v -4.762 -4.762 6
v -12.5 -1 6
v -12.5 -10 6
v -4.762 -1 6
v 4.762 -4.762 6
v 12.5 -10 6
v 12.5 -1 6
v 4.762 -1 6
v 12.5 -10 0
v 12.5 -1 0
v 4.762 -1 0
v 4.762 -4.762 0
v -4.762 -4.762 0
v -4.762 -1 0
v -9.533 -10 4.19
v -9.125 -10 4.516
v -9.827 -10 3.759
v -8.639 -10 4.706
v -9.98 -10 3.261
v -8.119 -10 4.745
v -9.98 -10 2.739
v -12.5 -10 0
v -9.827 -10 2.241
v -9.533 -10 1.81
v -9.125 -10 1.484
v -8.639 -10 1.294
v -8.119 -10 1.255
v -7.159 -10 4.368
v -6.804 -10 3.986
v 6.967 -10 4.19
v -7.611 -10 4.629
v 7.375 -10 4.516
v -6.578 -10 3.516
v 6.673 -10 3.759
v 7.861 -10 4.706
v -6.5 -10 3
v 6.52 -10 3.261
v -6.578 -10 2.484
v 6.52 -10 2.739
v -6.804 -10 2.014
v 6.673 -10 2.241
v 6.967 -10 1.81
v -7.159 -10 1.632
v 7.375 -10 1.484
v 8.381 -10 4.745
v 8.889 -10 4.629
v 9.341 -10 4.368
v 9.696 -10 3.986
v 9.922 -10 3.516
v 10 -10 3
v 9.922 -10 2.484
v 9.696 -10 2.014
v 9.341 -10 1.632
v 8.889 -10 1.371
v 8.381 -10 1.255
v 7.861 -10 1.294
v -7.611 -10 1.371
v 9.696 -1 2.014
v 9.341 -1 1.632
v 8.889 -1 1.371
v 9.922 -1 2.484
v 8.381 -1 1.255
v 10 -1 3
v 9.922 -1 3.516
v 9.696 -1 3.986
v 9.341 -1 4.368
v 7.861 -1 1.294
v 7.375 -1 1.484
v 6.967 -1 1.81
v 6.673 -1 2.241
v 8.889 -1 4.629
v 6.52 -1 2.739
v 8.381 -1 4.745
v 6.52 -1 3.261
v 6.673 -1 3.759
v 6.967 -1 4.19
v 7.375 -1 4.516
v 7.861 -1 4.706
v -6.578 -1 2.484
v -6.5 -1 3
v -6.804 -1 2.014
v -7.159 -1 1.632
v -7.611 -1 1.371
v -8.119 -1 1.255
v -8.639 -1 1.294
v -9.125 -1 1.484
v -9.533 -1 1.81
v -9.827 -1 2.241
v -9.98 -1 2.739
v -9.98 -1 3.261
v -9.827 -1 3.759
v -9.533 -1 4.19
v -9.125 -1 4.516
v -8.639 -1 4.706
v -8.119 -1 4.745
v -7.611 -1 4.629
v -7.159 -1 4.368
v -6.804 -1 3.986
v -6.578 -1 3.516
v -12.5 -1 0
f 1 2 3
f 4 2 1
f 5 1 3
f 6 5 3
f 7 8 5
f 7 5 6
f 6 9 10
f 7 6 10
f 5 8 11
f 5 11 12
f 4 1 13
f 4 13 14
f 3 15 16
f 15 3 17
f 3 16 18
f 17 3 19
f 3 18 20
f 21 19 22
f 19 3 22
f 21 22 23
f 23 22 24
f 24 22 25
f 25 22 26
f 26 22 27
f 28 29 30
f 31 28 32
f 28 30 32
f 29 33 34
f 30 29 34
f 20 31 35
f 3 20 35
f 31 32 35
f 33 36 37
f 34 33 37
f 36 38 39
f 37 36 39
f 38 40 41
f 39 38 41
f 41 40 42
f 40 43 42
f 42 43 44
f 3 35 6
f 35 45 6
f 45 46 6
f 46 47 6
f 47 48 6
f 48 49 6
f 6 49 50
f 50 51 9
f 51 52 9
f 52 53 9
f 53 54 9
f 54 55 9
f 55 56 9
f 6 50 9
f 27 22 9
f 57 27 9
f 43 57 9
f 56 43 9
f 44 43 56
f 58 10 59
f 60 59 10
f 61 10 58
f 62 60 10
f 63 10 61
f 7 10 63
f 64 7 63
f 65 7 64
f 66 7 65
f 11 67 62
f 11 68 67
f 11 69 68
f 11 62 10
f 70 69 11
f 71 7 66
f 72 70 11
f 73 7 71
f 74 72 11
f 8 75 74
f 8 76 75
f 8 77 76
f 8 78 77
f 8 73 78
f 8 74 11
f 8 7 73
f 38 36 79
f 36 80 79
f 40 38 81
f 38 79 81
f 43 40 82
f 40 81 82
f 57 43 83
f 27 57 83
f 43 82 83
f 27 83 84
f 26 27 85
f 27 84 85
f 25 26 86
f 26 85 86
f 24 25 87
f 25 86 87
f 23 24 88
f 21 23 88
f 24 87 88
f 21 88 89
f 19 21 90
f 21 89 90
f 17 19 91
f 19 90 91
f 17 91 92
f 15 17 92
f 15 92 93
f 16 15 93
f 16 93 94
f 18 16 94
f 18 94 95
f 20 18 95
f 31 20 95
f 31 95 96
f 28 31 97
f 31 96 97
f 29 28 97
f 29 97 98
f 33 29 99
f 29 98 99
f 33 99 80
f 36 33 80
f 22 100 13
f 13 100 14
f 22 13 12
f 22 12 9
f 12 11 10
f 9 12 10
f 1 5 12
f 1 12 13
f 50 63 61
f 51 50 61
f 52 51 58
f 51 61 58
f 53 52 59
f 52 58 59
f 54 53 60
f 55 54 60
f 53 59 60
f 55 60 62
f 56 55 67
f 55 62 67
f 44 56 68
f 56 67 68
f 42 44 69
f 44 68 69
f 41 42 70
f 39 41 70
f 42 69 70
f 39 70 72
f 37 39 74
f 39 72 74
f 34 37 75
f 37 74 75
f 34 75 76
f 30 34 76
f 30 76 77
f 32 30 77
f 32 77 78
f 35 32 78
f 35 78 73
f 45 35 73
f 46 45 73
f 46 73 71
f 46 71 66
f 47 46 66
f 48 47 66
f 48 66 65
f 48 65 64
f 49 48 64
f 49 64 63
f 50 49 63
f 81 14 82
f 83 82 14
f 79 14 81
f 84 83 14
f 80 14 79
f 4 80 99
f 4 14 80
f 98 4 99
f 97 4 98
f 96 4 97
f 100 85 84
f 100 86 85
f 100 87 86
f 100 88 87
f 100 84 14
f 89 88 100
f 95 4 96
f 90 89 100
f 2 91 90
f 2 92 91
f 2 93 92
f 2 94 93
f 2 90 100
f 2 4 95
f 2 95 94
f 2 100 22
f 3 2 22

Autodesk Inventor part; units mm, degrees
ref_plane "YZ Plane" through (0, 0, 0) normal (1, 0, 0) x (0, 1, 0)
ref_plane "XZ Plane" through (0, 0, 0) normal (0, 1, 0) x (-1, 0, 0)
ref_plane "XY Plane" through (0, 0, 0) normal (0, 0, 1) x (1, 0, 0)
sketch "Sketch1" plane through (0, 0, 0) normal (0, 0, 1) x (1, 0, 0)
  arc A0 (-4, 0) -> (4, 0) centre (0, 0) ccw
  line L0 (-4, 0) -> (-12.5, 0)
  line L1 (-12.5, 0) -> (-12.5, -10)
  line L2 (-12.5, -10) -> (12.5, -10)
  line L3 (12.5, -10) -> (12.5, 0)
  line L4 (12.5, 0) -> (4, 0)
  dimension "d0" = 4
  dimension "d1" = 10
  dimension "d2" = 25
extrude "Extrusion1" add sketch "Sketch1" along normal blind 6
sketch "Sketch2" plane through (-12.5, 0, 0) normal (0, 1, 0) x (1, 0, 0)
  line L0 (0, 0) -> (8.5, 0) projected
  line L1 (8.5, -6) -> (0, -6) projected
  line L2 (16.5, 0) -> (25, 0) projected
  line L3 (16.5, 0) -> (16.5, -6) projected
  line L4 (25, -6) -> (16.5, -6) projected
  line L5 (25, 0) -> (25, -6) projected
  line L6 (4.25, 0) -> (4.25, -6) construction
  line L7 (20.75, 0) -> (20.75, -6) construction
  circle A0 centre (4.25, -3) radius 1.75
  circle A1 centre (20.75, -3) radius 1.75
  point P0 (12.5, 0)
  dimension "d5" = 3.5
extrude "Extrusion2" cut sketch "Sketch2" against normal through all contours A0 | A1
sketch "Sketch3" plane through (0, 0, 6) normal (0, 0, 1) x (1, 0, 0)
  line L0 (12.5, -10) -> (12.5, 0) projected
  line L1 (-12.5, 0) -> (12.5, 0)
  line L2 (12.5, 0) -> (12.5, -1)
  line L3 (12.5, -1) -> (-12.5, -1)
  line L4 (-12.5, -1) -> (-12.5, 0)
  dimension "d8" = 1
extrude "Extrusion3" cut sketch "Sketch3" against normal through all
sketch "Sketch4" plane through (0, 0, 6) normal (0, 0, 1) x (1, 0, 0)
  line L0 (4.7625, -4.7625) -> (-4.7625, -4.7625)
  line L1 (-4.7625, -4.7625) -> (-4.7625, 4.7625)
  line L2 (-4.7625, 4.7625) -> (4.7625, 4.7625)
  line L3 (4.7625, 4.7625) -> (4.7625, -4.7625)
  line L4 (4.7625, -4.7625) -> (-4.7625, 4.7625) construction
  line L5 (-4.7625, -4.7625) -> (4.7625, 4.7625) construction
  point P0 (0, 0)
  dimension "d11" = 9.525
extrude "Extrusion4" cut sketch "Sketch4" against normal through all
properties part number "sensor bracket coupler"
